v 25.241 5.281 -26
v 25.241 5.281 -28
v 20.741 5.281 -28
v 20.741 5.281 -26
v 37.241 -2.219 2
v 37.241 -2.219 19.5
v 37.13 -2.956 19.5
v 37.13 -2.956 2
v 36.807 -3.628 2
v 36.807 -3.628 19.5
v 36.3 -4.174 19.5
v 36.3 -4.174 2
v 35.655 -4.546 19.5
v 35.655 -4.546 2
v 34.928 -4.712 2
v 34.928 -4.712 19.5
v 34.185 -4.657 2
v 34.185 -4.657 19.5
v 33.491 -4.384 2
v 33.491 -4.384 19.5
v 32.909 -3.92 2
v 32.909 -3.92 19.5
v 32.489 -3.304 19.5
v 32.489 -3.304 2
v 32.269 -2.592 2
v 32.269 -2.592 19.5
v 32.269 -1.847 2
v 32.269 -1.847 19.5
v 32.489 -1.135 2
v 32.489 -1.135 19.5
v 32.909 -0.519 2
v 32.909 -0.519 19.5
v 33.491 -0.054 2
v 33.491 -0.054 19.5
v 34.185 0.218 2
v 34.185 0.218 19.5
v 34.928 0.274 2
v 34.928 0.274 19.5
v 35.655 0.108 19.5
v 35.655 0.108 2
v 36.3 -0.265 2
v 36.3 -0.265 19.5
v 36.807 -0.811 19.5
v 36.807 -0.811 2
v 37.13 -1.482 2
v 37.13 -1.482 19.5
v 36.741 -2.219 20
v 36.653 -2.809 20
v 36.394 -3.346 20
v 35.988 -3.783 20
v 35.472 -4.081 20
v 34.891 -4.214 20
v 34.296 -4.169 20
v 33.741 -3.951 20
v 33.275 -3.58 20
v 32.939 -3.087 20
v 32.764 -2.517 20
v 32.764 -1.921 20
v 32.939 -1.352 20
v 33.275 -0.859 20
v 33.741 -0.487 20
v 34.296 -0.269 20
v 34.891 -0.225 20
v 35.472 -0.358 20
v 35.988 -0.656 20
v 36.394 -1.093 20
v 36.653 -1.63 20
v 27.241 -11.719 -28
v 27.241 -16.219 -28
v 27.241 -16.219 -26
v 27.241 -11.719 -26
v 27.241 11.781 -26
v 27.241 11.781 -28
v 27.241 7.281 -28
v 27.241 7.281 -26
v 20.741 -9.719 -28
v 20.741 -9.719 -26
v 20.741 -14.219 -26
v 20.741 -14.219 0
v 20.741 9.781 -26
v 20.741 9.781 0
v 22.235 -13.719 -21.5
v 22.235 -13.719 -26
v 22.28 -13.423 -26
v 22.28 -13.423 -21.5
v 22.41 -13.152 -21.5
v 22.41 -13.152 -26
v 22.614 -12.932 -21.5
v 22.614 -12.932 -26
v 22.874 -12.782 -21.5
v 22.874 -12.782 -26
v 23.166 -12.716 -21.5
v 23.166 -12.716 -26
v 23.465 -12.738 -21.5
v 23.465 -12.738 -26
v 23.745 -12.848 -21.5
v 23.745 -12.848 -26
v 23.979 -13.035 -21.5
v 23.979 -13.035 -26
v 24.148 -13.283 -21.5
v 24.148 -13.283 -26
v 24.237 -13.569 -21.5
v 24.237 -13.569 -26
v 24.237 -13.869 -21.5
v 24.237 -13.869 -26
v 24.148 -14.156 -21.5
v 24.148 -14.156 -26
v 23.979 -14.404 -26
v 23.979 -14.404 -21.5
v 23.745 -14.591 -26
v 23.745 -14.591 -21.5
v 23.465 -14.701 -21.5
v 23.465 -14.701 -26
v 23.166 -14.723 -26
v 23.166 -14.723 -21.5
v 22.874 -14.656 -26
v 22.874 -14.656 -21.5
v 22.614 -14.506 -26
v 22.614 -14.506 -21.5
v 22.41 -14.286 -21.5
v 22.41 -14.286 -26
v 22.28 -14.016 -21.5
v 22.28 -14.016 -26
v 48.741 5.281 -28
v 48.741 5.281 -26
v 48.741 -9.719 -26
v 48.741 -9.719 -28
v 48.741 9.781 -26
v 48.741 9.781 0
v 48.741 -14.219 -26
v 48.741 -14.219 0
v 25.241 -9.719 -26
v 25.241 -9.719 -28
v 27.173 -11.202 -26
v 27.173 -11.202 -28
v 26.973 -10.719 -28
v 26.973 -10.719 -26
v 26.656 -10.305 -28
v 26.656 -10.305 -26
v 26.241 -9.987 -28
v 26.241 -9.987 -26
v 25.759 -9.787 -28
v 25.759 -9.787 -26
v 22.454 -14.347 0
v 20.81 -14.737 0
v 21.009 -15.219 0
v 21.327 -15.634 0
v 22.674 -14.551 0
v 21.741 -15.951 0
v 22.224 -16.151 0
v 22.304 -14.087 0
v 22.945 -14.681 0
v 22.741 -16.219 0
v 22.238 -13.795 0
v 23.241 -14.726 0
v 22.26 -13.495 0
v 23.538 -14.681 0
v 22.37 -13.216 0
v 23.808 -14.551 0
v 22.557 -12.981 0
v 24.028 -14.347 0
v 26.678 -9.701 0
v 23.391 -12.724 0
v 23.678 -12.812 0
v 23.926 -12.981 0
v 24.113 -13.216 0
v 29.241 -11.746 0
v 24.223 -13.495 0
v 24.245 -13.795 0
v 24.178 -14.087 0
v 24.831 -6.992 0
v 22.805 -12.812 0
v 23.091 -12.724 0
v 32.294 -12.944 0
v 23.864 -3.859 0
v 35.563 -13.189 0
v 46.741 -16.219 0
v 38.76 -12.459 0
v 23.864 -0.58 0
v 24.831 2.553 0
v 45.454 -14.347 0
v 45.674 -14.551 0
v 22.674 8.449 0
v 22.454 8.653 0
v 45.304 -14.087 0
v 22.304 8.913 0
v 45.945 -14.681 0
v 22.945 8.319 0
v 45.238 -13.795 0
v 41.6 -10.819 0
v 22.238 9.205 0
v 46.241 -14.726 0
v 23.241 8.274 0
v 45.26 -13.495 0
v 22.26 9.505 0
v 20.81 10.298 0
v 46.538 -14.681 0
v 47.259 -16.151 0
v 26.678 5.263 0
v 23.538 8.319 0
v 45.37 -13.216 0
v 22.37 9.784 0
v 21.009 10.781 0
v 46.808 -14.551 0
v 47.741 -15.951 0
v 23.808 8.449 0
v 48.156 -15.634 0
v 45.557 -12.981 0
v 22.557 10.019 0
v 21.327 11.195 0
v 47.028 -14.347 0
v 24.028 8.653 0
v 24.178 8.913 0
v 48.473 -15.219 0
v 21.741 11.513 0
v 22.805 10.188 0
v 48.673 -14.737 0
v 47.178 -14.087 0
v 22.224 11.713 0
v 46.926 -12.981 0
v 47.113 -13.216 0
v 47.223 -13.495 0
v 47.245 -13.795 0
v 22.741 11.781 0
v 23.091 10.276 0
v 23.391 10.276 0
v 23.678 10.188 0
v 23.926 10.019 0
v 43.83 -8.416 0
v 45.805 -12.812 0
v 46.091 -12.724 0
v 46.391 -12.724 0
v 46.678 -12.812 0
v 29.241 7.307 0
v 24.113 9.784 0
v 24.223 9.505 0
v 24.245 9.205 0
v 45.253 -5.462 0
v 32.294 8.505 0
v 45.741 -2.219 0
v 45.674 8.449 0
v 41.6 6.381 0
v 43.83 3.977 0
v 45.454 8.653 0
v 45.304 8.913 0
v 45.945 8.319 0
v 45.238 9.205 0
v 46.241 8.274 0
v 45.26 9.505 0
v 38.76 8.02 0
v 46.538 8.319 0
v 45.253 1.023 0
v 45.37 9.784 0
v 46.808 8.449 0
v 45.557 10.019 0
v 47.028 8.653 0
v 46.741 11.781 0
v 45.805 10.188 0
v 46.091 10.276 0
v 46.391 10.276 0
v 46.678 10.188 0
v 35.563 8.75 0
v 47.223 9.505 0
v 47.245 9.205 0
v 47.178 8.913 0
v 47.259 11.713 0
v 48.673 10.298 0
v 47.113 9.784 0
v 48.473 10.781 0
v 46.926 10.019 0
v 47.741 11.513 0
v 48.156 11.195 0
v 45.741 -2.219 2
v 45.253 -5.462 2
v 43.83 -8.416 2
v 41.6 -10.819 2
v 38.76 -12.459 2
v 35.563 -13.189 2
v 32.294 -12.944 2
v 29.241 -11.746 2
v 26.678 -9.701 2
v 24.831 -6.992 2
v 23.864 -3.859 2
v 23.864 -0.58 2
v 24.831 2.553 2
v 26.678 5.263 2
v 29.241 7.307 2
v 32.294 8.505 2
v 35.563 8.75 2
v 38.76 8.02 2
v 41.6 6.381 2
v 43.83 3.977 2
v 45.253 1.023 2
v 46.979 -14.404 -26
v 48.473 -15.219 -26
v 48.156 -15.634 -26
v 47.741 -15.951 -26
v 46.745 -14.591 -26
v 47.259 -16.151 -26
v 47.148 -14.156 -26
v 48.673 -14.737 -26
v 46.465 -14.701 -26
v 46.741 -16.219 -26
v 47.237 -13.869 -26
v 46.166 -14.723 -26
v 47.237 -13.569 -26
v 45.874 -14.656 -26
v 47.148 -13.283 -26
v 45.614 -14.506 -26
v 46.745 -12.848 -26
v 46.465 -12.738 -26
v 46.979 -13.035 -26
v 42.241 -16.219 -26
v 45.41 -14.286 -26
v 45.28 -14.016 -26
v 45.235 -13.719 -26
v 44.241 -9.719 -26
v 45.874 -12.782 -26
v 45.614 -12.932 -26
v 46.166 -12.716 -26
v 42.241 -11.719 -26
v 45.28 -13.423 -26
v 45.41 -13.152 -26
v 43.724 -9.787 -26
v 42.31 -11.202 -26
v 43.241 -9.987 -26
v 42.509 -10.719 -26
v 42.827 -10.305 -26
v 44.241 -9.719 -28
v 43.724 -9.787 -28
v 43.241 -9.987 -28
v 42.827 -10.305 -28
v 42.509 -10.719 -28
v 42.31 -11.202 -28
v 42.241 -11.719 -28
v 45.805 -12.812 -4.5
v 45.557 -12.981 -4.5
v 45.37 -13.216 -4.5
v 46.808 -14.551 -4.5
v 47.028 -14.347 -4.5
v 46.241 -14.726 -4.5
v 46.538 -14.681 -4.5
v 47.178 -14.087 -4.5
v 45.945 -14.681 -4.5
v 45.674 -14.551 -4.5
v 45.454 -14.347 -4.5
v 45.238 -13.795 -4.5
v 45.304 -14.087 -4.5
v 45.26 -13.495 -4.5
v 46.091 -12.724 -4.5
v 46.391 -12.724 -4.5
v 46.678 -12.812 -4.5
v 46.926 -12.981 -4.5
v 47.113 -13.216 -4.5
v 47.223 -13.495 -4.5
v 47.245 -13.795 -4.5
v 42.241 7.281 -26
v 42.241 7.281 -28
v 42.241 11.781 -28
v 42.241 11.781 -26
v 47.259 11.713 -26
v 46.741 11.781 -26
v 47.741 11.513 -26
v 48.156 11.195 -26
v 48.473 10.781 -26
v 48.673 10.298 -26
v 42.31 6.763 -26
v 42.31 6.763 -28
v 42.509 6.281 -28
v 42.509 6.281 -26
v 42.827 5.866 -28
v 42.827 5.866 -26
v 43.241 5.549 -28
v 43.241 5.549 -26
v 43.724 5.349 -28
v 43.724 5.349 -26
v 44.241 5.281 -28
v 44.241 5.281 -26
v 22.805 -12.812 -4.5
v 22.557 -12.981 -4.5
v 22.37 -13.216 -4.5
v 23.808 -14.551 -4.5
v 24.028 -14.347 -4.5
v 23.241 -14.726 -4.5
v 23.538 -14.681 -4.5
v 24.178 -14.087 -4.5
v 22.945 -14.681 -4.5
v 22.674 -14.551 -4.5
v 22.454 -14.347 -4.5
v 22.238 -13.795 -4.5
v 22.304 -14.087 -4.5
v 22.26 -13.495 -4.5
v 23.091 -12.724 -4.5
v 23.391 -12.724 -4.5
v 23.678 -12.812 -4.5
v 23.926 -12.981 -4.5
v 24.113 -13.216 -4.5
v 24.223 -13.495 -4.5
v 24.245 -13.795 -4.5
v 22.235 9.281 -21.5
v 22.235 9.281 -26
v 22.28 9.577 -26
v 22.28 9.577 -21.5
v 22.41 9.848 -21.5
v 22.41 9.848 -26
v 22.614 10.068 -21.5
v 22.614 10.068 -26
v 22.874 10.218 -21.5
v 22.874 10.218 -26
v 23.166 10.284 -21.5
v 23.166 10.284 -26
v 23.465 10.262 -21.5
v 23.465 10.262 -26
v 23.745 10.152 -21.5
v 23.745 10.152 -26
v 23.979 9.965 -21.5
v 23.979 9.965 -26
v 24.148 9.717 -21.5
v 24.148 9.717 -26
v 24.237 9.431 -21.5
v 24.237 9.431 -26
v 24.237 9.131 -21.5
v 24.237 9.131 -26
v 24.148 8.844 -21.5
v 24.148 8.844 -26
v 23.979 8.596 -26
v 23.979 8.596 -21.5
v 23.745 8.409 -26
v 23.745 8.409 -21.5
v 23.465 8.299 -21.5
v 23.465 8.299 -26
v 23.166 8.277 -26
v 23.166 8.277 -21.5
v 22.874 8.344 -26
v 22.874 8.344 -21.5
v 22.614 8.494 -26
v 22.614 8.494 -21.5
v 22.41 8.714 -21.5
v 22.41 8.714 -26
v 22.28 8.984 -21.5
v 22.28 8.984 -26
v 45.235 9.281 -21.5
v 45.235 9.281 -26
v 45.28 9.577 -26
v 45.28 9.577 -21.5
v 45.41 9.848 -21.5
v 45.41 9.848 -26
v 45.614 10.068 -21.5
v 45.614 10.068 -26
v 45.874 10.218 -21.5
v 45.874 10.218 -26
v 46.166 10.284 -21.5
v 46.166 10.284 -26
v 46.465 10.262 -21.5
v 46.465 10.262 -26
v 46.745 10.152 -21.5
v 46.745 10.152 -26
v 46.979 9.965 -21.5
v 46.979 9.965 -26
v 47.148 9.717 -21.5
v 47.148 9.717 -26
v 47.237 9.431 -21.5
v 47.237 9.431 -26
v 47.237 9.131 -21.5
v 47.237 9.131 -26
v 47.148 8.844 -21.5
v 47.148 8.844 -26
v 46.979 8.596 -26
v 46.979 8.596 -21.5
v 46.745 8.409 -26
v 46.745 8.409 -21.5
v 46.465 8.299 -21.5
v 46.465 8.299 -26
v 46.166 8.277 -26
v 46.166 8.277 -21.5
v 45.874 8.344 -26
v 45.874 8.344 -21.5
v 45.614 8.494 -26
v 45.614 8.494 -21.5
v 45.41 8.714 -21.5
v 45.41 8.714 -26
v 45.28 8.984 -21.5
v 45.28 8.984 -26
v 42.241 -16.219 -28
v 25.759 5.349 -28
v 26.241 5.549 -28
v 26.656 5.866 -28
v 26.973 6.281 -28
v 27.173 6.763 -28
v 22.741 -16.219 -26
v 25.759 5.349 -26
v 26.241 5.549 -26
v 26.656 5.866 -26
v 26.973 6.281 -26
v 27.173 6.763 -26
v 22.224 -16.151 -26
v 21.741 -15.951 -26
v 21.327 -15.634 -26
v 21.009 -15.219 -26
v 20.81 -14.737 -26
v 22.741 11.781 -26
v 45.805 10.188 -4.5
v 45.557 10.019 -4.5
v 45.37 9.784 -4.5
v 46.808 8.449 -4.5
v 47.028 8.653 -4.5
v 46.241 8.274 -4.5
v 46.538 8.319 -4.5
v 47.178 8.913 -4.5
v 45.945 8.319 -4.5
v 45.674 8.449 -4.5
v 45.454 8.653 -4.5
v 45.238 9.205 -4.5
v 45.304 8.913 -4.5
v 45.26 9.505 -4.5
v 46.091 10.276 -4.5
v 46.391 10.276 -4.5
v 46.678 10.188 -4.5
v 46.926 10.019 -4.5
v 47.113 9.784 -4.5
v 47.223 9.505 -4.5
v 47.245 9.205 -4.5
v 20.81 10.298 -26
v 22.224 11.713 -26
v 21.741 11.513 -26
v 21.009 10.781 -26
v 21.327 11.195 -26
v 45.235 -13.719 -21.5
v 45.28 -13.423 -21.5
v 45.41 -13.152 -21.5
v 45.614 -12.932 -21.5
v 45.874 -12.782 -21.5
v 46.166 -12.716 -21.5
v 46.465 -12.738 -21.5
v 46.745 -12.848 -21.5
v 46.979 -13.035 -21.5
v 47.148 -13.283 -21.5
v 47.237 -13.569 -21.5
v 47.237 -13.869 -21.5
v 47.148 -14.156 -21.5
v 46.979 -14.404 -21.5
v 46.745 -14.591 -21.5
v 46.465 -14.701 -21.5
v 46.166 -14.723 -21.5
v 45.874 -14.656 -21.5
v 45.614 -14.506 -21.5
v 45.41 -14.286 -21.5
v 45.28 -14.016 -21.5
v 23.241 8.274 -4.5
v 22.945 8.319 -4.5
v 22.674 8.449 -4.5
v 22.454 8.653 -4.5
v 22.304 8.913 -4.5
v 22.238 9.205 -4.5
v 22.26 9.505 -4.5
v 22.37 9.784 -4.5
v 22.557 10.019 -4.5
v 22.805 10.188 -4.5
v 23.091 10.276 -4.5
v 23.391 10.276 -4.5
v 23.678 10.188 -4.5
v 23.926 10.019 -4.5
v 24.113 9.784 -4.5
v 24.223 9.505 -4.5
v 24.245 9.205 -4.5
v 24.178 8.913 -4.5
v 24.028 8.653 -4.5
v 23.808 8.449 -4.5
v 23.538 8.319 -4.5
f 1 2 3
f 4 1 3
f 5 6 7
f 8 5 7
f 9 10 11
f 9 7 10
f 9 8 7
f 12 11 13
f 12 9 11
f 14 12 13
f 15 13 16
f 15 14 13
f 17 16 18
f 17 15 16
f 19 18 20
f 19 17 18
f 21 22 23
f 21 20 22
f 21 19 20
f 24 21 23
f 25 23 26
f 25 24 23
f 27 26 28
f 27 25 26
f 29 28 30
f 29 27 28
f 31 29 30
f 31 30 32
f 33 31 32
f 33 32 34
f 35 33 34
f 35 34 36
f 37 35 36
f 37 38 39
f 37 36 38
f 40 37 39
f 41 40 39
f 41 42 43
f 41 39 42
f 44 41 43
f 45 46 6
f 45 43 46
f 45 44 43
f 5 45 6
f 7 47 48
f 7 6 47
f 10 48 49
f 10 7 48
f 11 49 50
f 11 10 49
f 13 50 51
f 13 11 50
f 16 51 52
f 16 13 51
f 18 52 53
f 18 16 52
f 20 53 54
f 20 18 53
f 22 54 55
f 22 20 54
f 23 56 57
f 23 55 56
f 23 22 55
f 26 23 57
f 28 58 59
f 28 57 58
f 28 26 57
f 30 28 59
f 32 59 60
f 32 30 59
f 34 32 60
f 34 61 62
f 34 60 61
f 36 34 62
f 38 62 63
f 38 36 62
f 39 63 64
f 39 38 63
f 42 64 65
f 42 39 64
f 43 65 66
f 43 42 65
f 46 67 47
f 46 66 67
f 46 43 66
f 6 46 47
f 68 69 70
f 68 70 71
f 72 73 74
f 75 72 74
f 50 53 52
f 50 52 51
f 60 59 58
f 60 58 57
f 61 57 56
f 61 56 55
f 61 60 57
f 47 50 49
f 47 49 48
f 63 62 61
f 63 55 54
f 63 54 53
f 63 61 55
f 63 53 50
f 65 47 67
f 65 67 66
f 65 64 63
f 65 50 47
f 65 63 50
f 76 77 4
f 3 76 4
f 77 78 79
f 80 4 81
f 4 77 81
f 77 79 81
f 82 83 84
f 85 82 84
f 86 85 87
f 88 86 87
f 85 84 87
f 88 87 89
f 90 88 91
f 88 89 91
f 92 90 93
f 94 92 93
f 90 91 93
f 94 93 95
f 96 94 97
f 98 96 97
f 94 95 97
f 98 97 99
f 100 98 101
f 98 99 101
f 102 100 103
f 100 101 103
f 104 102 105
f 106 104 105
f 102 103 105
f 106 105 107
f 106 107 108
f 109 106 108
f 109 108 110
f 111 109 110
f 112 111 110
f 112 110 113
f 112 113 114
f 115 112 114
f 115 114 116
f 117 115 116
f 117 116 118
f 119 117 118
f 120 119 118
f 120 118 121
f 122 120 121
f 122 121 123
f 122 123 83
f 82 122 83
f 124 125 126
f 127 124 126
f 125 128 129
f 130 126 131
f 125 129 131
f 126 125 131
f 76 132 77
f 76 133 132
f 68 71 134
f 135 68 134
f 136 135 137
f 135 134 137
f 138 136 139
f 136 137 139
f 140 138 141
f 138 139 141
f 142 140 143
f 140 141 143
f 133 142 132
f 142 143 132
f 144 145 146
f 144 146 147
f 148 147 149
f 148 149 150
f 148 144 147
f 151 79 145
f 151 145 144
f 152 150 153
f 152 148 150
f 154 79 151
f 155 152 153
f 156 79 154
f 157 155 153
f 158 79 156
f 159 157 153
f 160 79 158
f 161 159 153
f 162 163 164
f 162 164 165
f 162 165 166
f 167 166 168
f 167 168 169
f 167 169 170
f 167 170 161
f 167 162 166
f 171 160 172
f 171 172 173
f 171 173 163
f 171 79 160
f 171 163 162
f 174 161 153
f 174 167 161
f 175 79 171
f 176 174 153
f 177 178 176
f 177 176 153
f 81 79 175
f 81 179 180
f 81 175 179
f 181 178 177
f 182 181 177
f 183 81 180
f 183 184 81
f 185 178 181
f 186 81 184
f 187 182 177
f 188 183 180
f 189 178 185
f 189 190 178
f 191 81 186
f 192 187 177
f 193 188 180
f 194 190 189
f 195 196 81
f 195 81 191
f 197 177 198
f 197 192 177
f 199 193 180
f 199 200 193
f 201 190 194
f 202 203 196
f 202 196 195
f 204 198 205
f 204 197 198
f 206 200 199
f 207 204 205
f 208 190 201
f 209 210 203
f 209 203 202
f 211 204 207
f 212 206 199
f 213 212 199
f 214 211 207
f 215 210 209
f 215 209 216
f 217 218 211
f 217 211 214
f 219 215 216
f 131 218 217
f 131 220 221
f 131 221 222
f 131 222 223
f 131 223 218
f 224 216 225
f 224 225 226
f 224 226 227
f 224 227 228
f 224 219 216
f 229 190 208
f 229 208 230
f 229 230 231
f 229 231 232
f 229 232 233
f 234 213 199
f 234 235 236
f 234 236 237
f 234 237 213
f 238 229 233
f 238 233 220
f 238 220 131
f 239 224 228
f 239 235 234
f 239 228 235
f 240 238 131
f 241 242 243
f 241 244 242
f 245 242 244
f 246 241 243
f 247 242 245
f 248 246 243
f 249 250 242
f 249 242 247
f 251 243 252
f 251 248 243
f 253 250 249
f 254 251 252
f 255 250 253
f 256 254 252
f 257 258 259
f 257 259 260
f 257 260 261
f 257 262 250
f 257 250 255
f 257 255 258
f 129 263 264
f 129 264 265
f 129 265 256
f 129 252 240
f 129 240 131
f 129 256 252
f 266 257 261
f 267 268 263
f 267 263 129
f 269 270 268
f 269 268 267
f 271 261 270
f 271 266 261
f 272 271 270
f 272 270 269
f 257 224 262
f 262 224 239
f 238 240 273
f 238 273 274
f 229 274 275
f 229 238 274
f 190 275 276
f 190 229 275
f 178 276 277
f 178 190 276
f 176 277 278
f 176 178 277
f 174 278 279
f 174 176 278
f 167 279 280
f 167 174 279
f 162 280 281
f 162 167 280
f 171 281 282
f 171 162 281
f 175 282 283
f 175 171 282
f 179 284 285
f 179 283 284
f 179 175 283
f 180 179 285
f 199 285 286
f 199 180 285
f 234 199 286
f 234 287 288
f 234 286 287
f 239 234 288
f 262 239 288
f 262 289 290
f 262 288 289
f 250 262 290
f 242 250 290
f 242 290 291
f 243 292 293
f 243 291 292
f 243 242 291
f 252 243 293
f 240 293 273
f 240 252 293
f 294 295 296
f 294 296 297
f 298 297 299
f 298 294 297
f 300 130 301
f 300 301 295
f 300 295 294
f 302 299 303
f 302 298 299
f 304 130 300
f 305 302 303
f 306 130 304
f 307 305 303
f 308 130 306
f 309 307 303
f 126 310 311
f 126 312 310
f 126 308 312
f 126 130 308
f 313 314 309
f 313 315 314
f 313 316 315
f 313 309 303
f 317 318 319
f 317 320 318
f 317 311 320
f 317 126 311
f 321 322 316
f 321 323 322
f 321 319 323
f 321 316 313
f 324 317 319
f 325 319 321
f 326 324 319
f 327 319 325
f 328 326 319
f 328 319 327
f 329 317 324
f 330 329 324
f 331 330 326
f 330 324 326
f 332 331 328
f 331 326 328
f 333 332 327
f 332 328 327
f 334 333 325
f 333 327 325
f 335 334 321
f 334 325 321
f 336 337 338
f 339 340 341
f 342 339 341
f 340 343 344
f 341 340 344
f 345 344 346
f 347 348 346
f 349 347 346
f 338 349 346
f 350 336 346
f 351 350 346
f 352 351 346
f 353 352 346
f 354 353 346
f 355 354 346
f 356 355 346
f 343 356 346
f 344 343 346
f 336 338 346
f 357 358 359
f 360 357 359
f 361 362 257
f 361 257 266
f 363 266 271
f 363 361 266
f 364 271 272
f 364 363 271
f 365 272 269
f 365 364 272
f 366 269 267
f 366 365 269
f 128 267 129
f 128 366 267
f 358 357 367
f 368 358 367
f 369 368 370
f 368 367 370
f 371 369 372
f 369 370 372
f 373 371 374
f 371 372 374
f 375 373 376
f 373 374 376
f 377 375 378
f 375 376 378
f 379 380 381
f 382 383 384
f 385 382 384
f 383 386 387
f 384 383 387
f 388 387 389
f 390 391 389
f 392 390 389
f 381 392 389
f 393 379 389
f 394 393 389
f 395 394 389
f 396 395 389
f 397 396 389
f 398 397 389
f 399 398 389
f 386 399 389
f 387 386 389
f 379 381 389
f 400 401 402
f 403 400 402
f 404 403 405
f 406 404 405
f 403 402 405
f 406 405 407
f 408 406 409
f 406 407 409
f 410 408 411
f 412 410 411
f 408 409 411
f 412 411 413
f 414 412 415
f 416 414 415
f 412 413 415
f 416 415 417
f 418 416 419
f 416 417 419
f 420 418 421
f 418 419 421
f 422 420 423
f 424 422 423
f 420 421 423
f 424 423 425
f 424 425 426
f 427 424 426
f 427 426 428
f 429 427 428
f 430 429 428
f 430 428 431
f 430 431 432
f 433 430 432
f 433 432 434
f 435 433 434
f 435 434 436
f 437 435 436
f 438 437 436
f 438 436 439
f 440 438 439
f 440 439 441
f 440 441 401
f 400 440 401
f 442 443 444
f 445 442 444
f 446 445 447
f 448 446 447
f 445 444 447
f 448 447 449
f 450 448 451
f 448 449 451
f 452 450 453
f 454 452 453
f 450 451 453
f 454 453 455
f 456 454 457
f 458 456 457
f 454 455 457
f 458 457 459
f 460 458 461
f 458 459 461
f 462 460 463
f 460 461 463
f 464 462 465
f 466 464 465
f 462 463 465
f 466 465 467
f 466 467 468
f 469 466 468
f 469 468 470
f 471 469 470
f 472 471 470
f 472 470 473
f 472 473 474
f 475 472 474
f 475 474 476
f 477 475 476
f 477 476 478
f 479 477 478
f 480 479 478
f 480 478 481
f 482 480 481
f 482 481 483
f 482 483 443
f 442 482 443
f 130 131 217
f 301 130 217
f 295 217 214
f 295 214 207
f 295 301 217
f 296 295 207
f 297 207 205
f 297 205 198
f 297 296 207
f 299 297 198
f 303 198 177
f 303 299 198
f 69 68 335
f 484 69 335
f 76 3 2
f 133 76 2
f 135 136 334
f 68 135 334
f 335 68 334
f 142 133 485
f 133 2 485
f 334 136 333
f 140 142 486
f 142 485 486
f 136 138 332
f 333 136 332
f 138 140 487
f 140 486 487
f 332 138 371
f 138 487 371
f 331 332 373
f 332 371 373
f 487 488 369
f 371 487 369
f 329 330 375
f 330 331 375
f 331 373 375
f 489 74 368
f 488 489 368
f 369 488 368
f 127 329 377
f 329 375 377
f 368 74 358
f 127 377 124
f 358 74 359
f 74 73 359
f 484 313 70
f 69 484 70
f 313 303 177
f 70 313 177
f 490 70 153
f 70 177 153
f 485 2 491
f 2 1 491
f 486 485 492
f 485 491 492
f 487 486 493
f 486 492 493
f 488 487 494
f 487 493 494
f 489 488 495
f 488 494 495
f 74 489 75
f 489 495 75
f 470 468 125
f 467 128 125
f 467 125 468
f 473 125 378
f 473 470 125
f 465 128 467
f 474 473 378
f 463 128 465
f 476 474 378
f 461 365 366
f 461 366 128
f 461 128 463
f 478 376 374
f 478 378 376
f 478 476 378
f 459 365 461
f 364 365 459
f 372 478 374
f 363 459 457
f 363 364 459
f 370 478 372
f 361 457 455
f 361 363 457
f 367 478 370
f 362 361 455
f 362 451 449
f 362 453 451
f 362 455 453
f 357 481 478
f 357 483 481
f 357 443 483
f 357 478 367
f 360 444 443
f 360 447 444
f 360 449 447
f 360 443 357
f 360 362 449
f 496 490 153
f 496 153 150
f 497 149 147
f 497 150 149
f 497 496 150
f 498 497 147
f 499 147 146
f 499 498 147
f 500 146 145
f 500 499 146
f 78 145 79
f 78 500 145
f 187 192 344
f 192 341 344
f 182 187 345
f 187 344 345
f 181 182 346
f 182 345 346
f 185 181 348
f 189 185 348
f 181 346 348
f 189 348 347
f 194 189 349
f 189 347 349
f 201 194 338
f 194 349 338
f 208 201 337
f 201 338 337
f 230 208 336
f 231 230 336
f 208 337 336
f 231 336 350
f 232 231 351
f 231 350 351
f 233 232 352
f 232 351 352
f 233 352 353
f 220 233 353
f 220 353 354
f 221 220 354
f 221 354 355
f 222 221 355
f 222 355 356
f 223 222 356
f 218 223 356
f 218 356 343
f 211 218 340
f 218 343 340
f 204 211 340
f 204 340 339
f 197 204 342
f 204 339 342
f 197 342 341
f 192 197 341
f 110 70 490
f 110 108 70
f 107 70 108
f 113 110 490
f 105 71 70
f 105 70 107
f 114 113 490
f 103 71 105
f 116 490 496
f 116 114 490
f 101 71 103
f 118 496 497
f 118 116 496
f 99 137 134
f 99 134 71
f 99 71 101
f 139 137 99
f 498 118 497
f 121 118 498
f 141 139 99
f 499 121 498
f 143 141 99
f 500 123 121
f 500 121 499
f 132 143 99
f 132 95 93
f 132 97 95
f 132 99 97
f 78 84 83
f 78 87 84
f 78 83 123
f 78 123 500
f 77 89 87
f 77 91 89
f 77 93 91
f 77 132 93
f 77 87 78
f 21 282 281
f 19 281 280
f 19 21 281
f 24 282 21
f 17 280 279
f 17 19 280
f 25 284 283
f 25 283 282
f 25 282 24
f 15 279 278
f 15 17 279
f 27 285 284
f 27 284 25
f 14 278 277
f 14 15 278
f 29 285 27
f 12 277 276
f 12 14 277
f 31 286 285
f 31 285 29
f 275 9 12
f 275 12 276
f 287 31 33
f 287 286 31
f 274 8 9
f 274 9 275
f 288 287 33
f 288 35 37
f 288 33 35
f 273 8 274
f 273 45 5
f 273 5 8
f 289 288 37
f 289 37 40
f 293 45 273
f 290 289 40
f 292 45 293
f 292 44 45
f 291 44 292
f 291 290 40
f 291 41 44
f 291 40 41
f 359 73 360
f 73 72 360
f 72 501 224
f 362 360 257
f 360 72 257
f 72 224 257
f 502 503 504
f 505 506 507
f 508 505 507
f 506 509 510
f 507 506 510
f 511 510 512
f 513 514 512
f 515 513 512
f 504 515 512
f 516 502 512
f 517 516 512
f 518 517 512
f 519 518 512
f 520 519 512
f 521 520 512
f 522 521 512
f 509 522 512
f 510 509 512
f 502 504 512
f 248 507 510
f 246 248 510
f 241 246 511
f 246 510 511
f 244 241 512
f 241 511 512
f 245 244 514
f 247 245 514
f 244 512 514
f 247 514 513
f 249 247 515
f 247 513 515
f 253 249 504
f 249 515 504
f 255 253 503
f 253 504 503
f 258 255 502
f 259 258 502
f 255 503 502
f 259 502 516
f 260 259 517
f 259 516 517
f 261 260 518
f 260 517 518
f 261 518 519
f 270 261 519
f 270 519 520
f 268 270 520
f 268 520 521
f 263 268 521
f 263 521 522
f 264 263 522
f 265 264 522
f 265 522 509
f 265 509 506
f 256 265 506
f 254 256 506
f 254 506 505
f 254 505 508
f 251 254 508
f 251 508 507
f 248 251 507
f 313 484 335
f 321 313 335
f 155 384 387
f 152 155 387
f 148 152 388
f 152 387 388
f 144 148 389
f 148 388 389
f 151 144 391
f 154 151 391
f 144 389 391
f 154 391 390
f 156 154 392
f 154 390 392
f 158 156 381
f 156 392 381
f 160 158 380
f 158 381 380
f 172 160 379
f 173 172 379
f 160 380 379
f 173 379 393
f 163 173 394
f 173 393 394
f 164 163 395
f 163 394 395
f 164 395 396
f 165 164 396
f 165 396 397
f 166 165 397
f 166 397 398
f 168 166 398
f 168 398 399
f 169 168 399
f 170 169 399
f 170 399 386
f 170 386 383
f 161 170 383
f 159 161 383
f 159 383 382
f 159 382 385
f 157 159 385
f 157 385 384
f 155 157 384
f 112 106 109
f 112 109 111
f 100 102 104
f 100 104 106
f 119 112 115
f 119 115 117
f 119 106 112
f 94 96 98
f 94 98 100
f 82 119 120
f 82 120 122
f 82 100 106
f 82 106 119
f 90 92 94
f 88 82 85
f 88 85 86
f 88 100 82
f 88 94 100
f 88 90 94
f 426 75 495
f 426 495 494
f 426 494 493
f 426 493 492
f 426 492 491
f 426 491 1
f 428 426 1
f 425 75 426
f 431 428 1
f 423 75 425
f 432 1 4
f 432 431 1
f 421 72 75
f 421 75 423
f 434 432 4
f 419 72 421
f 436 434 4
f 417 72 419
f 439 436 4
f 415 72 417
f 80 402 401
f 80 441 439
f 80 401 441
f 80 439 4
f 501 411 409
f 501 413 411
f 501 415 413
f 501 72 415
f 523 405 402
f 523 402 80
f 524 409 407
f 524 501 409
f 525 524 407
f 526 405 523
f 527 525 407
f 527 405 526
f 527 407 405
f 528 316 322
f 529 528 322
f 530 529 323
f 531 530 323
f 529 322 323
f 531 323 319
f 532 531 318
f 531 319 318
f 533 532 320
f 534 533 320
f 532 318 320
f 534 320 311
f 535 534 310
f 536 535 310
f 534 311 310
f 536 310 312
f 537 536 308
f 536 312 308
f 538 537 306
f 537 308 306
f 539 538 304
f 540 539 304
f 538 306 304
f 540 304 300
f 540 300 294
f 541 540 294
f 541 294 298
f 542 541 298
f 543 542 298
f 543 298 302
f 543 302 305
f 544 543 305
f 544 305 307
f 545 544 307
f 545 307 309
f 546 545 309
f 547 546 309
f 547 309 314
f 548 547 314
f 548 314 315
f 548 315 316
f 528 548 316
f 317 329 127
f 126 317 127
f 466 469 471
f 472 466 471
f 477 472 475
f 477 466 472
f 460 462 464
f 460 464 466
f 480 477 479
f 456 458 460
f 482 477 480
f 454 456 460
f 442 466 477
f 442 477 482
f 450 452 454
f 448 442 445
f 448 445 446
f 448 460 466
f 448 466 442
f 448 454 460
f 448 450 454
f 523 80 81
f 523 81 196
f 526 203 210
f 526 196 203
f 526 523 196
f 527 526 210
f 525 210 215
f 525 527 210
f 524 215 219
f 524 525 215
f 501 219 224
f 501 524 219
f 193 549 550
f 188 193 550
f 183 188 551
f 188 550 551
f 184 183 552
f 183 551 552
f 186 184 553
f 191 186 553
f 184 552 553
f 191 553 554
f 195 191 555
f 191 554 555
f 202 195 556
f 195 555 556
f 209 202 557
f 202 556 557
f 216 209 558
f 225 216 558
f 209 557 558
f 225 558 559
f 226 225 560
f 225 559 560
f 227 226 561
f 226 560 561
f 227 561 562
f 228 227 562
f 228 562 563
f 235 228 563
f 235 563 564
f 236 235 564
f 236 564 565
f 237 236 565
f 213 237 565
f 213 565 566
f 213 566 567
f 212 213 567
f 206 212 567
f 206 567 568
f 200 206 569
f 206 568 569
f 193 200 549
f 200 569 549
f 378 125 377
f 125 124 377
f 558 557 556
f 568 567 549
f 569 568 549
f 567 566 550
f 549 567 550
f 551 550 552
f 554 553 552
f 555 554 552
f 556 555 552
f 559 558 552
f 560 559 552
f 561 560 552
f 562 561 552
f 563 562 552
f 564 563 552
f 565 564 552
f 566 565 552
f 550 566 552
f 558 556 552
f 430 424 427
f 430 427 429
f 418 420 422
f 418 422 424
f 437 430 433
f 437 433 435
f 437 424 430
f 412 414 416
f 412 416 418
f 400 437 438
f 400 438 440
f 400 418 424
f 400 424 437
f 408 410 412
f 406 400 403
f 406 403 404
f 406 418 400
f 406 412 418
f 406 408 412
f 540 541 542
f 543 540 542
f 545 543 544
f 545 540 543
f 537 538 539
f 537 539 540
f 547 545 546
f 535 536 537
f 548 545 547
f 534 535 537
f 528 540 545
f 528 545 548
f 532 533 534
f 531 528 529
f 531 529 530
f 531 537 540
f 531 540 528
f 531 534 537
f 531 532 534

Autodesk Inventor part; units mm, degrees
ref_plane "YZ Plane" through (0, 0, 0) normal (1, 0, 0) x (0, 1, 0)
ref_plane "XZ Plane" through (0, 0, 0) normal (0, 1, 0) x (-1, 0, 0)
ref_plane "XY Plane" through (0, 0, 0) normal (0, 0, 1) x (1, 0, 0)
sketch "Sketch6" plane through (0, 0, 0) normal (0, 0, 1) x (1, 0, 0)
  line L0 (20.7414, 11.7807) -> (48.7414, 11.7807)
  line L1 (48.7414, 11.7807) -> (48.7414, -16.2193)
  line L2 (48.7414, -16.2193) -> (20.7414, -16.2193)
  line L3 (20.7414, -16.2193) -> (20.7414, 11.7807)
  point P0 (0, 0)
  dimension "d10" = 28
extrude "Extrusion6" add sketch "Sketch6" against normal blind 28
sketch "Sketch7" plane through (0, 0, 0) normal (0, 0, 1) x (1, 0, 0)
  line L0 (48.7414, 11.7807) -> (20.7414, 11.7807) projected
  line L1 (20.7414, 11.7807) -> (20.7414, -16.2193) projected
  line L2 (48.7414, -16.2193) -> (48.7414, 11.7807) projected
  line L3 (20.7414, -16.2193) -> (48.7414, -16.2193) projected
  point P0 (0, 0)
  point P1 (23.2414, 9.2807)
  point P2 (46.2414, 9.2807)
  point P3 (46.2414, -13.7193)
  point P4 (23.2414, -13.7193)
  point P5 (46.7414, 11.7807)
  point P6 (22.7414, 11.7807)
  point P7 (20.7414, 9.7807)
  point P8 (20.7414, -14.2193)
  point P9 (48.7414, -14.2193)
  point P10 (48.7414, 9.7807)
  point P11 (22.7414, -16.2193)
  point P12 (46.7414, -16.2193)
  dimension "d14" = 2.5
  dimension "d15" = 2.5
  dimension "d16" = 2.5
  dimension "d17" = 2.5
hole "Hole1" at (23.2414, 9.2807, 0) at (46.2414, 9.2807, 0) at (46.2414, -13.7193, 0) at (23.2414, -13.7193, 0) direction (0, 0, -1) diameter 2.013 depth 4.5 thread size "M2.5x0.45" class "6H" standard "ANSI Metric M Profile"
sketch "Sketch8" plane through (0, 0, 0) normal (0, 0, 1) x (1, 0, 0)
  circle A0 centre (34.7414, -2.2193) radius 11
  line L0 (48.7414, -16.2193) -> (48.7414, 11.7807) projected
  line L1 (48.7414, 11.7807) -> (20.7414, 11.7807) projected
  point P0 (0, 0)
  point P1 (48.7414, -2.2193)
  point P2 (48.7414, -14.2193)
  point P3 (48.7414, 9.7807)
  point P4 (34.7414, 11.7807)
  point P5 (46.7414, 11.7807)
  point P6 (22.7414, 11.7807)
  dimension "d25" = 22
extrude "Extrusion7" add sketch "Sketch8" along normal blind 2
sketch "Sketch9" plane through (34.7414, -2.2193, 2) normal (0, 0, 1) x (1, 0, 0)
  circle A0 centre (0, 0) radius 2.5
  circle A1 centre (0, 0) radius 11 projected
  point P0 (-34.7414, 2.2193)
  dimension "d28" = 5
extrude "Extrusion8" add sketch "Sketch9" along normal blind 18 contours A0
chamfer "Chamfer1" distance 0.5 angle 45 1 edges at (32.2414, -2.2193, 20)
sketch "Sketch10" plane through (0, 0, -28) normal (0, 0, -1) x (-1, 0, 0)
  line L0 (-20.7414, 11.7807) -> (-27.2414, 11.7807)
  line L1 (-27.2414, 11.7807) -> (-27.2414, 5.2807)
  line L2 (-27.2414, 5.2807) -> (-20.7414, 5.2807)
  line L3 (-20.7414, 5.2807) -> (-20.7414, 11.7807)
  line L4 (-20.7414, -16.2193) -> (-27.2414, -16.2193)
  line L5 (-27.2414, -16.2193) -> (-27.2414, -9.7193)
  line L6 (-27.2414, -9.7193) -> (-20.7414, -9.7193)
  line L7 (-20.7414, -9.7193) -> (-20.7414, -16.2193)
  line L8 (-48.7414, -16.2193) -> (-42.2414, -16.2193)
  line L9 (-42.2414, -16.2193) -> (-42.2414, -9.7193)
  line L10 (-42.2414, -9.7193) -> (-48.7414, -9.7193)
  line L11 (-48.7414, -9.7193) -> (-48.7414, -16.2193)
  line L12 (-42.2414, 11.7807) -> (-48.7414, 11.7807)
  line L13 (-48.7414, 11.7807) -> (-48.7414, 5.2807)
  line L14 (-48.7414, 5.2807) -> (-42.2414, 5.2807)
  line L15 (-42.2414, 5.2807) -> (-42.2414, 11.7807)
  line L16 (-20.7414, -16.2193) -> (-20.7414, 11.7807) projected
  line L17 (-20.7414, 11.7807) -> (-48.7414, 11.7807) projected
  line L18 (-48.7414, -16.2193) -> (-20.7414, -16.2193) projected
  line L19 (-48.7414, 11.7807) -> (-48.7414, -16.2193) projected
  point P0 (0, 0)
  point P1 (-20.7414, -14.2193)
  point P2 (-20.7414, 9.7807)
  point P3 (-22.7414, 11.7807)
  point P4 (-46.7414, 11.7807)
  point P5 (-46.7414, -16.2193)
  point P6 (-22.7414, -16.2193)
  point P7 (-48.7414, 9.7807)
  point P8 (-48.7414, -14.2193)
  dimension "d34" = 6.5
extrude "Extrusion9" cut sketch "Sketch10" against normal blind 2 contours L3 L2 L1 L0 | L15 L14 L13 L12 | L7 L4 L5 L6 | L10 L9 L8 L11
sketch "Sketch11" plane through (0, 0, -26) normal (0, 0, -1) x (-1, 0, 0)
  circle A0 centre (-23.2414, -13.7193) radius 1.0065 projected
  circle A1 centre (-23.2414, 9.2807) radius 1.0065 projected
  circle A2 centre (-46.2414, -13.7193) radius 1.0065 projected
  circle A3 centre (-46.2414, 9.2807) radius 1.0065 projected
  point P0 (0, 0)
extrude "Extrusion10" cut sketch "Sketch11" against normal blind 4.5
fillet "Fillet2" radius 2 8 edges at (20.7414, 11.7807, -13) (48.7414, 11.7807, -13) (20.7414, -16.2193, -13) (48.7414, -16.2193, -13) (27.2414, -9.7193, -27) (27.2414, 5.2807, -27) (42.2414, 5.2807, -27) (42.2414, -9.7193, -27)
equation "\"d11\" = MotorHeightBase"
equation "\"d17\" = d15"
equation "\"MotorHeightBase\" = 28"
properties part number "NEMA 11"
